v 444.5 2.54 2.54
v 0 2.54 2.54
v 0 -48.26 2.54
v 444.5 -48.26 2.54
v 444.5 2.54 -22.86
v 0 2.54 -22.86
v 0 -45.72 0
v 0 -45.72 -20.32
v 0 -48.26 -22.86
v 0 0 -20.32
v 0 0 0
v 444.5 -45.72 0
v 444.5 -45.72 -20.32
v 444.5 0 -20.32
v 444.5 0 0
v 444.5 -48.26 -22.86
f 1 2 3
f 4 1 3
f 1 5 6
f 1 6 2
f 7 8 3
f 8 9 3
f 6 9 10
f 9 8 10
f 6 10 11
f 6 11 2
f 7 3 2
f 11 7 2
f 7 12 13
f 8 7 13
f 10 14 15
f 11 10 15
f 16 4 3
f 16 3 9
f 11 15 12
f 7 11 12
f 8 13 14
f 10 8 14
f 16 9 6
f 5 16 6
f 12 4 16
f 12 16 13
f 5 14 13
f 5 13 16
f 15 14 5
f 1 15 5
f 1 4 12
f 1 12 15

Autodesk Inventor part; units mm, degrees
ref_plane "YZ Plane" through (0, 0, 0) normal (1, 0, 0) x (0, 1, 0)
ref_plane "XZ Plane" through (0, 0, 0) normal (0, 1, 0) x (-1, 0, 0)
sketch "Sketch1" plane through (0, 0, 0) normal (1, 0, 0) x (0, 1, 0)
  line L0 (2.54, 2.54) -> (-48.26, 2.54)
  line L1 (-48.26, 2.54) -> (-48.26, -22.86)
  line L2 (-48.26, -22.86) -> (2.54, -22.86)
  line L3 (2.54, -22.86) -> (2.54, 2.54)
  line L4 (0, 0) -> (-45.72, 0)
  line L5 (-45.72, 0) -> (-45.72, -20.32)
  line L6 (-45.72, -20.32) -> (0, -20.32)
  line L7 (0, -20.32) -> (0, 0)
  dimension "d0" = 50.8
  dimension "d1" = 25.4
  dimension "d5" = 2.54
  dimension "d6" = 2.54
  dimension "d7" = 2.54
  dimension "d8" = 2.54
extrude "Extrusion1" add sketch "Sketch1" along normal blind 444.5
ref_plane "Work Plane1" through (0, -48.26, 1.27) normal (0, 0, 1) x (1, 0, 0)
sketch "Sketch2" plane through (0, -48.26, 1.27) normal (0, 0, 1) x (1, 0, 0)
  line L0 (0, 50.8) -> (444.5, 50.8) projected
  line L1 (222.25, 50.8) -> (222.25, 0)
  line L2 (0, 0) -> (444.5, 0) projected
  line L3 (222.25, 25.4) -> (31.75, 25.4)
  line L4 (222.25, 25.4) -> (412.75, 25.4)
  line L5 (222.25, 25.4) -> (222.25, 22.225)
  point P0 (0, 48.26)
  dimension "d11" = 190.5
  dimension "d12" = 190.5
  dimension "d13" = 3.175
  dimension "d14" = 444.5
properties part number "Drive base side"
